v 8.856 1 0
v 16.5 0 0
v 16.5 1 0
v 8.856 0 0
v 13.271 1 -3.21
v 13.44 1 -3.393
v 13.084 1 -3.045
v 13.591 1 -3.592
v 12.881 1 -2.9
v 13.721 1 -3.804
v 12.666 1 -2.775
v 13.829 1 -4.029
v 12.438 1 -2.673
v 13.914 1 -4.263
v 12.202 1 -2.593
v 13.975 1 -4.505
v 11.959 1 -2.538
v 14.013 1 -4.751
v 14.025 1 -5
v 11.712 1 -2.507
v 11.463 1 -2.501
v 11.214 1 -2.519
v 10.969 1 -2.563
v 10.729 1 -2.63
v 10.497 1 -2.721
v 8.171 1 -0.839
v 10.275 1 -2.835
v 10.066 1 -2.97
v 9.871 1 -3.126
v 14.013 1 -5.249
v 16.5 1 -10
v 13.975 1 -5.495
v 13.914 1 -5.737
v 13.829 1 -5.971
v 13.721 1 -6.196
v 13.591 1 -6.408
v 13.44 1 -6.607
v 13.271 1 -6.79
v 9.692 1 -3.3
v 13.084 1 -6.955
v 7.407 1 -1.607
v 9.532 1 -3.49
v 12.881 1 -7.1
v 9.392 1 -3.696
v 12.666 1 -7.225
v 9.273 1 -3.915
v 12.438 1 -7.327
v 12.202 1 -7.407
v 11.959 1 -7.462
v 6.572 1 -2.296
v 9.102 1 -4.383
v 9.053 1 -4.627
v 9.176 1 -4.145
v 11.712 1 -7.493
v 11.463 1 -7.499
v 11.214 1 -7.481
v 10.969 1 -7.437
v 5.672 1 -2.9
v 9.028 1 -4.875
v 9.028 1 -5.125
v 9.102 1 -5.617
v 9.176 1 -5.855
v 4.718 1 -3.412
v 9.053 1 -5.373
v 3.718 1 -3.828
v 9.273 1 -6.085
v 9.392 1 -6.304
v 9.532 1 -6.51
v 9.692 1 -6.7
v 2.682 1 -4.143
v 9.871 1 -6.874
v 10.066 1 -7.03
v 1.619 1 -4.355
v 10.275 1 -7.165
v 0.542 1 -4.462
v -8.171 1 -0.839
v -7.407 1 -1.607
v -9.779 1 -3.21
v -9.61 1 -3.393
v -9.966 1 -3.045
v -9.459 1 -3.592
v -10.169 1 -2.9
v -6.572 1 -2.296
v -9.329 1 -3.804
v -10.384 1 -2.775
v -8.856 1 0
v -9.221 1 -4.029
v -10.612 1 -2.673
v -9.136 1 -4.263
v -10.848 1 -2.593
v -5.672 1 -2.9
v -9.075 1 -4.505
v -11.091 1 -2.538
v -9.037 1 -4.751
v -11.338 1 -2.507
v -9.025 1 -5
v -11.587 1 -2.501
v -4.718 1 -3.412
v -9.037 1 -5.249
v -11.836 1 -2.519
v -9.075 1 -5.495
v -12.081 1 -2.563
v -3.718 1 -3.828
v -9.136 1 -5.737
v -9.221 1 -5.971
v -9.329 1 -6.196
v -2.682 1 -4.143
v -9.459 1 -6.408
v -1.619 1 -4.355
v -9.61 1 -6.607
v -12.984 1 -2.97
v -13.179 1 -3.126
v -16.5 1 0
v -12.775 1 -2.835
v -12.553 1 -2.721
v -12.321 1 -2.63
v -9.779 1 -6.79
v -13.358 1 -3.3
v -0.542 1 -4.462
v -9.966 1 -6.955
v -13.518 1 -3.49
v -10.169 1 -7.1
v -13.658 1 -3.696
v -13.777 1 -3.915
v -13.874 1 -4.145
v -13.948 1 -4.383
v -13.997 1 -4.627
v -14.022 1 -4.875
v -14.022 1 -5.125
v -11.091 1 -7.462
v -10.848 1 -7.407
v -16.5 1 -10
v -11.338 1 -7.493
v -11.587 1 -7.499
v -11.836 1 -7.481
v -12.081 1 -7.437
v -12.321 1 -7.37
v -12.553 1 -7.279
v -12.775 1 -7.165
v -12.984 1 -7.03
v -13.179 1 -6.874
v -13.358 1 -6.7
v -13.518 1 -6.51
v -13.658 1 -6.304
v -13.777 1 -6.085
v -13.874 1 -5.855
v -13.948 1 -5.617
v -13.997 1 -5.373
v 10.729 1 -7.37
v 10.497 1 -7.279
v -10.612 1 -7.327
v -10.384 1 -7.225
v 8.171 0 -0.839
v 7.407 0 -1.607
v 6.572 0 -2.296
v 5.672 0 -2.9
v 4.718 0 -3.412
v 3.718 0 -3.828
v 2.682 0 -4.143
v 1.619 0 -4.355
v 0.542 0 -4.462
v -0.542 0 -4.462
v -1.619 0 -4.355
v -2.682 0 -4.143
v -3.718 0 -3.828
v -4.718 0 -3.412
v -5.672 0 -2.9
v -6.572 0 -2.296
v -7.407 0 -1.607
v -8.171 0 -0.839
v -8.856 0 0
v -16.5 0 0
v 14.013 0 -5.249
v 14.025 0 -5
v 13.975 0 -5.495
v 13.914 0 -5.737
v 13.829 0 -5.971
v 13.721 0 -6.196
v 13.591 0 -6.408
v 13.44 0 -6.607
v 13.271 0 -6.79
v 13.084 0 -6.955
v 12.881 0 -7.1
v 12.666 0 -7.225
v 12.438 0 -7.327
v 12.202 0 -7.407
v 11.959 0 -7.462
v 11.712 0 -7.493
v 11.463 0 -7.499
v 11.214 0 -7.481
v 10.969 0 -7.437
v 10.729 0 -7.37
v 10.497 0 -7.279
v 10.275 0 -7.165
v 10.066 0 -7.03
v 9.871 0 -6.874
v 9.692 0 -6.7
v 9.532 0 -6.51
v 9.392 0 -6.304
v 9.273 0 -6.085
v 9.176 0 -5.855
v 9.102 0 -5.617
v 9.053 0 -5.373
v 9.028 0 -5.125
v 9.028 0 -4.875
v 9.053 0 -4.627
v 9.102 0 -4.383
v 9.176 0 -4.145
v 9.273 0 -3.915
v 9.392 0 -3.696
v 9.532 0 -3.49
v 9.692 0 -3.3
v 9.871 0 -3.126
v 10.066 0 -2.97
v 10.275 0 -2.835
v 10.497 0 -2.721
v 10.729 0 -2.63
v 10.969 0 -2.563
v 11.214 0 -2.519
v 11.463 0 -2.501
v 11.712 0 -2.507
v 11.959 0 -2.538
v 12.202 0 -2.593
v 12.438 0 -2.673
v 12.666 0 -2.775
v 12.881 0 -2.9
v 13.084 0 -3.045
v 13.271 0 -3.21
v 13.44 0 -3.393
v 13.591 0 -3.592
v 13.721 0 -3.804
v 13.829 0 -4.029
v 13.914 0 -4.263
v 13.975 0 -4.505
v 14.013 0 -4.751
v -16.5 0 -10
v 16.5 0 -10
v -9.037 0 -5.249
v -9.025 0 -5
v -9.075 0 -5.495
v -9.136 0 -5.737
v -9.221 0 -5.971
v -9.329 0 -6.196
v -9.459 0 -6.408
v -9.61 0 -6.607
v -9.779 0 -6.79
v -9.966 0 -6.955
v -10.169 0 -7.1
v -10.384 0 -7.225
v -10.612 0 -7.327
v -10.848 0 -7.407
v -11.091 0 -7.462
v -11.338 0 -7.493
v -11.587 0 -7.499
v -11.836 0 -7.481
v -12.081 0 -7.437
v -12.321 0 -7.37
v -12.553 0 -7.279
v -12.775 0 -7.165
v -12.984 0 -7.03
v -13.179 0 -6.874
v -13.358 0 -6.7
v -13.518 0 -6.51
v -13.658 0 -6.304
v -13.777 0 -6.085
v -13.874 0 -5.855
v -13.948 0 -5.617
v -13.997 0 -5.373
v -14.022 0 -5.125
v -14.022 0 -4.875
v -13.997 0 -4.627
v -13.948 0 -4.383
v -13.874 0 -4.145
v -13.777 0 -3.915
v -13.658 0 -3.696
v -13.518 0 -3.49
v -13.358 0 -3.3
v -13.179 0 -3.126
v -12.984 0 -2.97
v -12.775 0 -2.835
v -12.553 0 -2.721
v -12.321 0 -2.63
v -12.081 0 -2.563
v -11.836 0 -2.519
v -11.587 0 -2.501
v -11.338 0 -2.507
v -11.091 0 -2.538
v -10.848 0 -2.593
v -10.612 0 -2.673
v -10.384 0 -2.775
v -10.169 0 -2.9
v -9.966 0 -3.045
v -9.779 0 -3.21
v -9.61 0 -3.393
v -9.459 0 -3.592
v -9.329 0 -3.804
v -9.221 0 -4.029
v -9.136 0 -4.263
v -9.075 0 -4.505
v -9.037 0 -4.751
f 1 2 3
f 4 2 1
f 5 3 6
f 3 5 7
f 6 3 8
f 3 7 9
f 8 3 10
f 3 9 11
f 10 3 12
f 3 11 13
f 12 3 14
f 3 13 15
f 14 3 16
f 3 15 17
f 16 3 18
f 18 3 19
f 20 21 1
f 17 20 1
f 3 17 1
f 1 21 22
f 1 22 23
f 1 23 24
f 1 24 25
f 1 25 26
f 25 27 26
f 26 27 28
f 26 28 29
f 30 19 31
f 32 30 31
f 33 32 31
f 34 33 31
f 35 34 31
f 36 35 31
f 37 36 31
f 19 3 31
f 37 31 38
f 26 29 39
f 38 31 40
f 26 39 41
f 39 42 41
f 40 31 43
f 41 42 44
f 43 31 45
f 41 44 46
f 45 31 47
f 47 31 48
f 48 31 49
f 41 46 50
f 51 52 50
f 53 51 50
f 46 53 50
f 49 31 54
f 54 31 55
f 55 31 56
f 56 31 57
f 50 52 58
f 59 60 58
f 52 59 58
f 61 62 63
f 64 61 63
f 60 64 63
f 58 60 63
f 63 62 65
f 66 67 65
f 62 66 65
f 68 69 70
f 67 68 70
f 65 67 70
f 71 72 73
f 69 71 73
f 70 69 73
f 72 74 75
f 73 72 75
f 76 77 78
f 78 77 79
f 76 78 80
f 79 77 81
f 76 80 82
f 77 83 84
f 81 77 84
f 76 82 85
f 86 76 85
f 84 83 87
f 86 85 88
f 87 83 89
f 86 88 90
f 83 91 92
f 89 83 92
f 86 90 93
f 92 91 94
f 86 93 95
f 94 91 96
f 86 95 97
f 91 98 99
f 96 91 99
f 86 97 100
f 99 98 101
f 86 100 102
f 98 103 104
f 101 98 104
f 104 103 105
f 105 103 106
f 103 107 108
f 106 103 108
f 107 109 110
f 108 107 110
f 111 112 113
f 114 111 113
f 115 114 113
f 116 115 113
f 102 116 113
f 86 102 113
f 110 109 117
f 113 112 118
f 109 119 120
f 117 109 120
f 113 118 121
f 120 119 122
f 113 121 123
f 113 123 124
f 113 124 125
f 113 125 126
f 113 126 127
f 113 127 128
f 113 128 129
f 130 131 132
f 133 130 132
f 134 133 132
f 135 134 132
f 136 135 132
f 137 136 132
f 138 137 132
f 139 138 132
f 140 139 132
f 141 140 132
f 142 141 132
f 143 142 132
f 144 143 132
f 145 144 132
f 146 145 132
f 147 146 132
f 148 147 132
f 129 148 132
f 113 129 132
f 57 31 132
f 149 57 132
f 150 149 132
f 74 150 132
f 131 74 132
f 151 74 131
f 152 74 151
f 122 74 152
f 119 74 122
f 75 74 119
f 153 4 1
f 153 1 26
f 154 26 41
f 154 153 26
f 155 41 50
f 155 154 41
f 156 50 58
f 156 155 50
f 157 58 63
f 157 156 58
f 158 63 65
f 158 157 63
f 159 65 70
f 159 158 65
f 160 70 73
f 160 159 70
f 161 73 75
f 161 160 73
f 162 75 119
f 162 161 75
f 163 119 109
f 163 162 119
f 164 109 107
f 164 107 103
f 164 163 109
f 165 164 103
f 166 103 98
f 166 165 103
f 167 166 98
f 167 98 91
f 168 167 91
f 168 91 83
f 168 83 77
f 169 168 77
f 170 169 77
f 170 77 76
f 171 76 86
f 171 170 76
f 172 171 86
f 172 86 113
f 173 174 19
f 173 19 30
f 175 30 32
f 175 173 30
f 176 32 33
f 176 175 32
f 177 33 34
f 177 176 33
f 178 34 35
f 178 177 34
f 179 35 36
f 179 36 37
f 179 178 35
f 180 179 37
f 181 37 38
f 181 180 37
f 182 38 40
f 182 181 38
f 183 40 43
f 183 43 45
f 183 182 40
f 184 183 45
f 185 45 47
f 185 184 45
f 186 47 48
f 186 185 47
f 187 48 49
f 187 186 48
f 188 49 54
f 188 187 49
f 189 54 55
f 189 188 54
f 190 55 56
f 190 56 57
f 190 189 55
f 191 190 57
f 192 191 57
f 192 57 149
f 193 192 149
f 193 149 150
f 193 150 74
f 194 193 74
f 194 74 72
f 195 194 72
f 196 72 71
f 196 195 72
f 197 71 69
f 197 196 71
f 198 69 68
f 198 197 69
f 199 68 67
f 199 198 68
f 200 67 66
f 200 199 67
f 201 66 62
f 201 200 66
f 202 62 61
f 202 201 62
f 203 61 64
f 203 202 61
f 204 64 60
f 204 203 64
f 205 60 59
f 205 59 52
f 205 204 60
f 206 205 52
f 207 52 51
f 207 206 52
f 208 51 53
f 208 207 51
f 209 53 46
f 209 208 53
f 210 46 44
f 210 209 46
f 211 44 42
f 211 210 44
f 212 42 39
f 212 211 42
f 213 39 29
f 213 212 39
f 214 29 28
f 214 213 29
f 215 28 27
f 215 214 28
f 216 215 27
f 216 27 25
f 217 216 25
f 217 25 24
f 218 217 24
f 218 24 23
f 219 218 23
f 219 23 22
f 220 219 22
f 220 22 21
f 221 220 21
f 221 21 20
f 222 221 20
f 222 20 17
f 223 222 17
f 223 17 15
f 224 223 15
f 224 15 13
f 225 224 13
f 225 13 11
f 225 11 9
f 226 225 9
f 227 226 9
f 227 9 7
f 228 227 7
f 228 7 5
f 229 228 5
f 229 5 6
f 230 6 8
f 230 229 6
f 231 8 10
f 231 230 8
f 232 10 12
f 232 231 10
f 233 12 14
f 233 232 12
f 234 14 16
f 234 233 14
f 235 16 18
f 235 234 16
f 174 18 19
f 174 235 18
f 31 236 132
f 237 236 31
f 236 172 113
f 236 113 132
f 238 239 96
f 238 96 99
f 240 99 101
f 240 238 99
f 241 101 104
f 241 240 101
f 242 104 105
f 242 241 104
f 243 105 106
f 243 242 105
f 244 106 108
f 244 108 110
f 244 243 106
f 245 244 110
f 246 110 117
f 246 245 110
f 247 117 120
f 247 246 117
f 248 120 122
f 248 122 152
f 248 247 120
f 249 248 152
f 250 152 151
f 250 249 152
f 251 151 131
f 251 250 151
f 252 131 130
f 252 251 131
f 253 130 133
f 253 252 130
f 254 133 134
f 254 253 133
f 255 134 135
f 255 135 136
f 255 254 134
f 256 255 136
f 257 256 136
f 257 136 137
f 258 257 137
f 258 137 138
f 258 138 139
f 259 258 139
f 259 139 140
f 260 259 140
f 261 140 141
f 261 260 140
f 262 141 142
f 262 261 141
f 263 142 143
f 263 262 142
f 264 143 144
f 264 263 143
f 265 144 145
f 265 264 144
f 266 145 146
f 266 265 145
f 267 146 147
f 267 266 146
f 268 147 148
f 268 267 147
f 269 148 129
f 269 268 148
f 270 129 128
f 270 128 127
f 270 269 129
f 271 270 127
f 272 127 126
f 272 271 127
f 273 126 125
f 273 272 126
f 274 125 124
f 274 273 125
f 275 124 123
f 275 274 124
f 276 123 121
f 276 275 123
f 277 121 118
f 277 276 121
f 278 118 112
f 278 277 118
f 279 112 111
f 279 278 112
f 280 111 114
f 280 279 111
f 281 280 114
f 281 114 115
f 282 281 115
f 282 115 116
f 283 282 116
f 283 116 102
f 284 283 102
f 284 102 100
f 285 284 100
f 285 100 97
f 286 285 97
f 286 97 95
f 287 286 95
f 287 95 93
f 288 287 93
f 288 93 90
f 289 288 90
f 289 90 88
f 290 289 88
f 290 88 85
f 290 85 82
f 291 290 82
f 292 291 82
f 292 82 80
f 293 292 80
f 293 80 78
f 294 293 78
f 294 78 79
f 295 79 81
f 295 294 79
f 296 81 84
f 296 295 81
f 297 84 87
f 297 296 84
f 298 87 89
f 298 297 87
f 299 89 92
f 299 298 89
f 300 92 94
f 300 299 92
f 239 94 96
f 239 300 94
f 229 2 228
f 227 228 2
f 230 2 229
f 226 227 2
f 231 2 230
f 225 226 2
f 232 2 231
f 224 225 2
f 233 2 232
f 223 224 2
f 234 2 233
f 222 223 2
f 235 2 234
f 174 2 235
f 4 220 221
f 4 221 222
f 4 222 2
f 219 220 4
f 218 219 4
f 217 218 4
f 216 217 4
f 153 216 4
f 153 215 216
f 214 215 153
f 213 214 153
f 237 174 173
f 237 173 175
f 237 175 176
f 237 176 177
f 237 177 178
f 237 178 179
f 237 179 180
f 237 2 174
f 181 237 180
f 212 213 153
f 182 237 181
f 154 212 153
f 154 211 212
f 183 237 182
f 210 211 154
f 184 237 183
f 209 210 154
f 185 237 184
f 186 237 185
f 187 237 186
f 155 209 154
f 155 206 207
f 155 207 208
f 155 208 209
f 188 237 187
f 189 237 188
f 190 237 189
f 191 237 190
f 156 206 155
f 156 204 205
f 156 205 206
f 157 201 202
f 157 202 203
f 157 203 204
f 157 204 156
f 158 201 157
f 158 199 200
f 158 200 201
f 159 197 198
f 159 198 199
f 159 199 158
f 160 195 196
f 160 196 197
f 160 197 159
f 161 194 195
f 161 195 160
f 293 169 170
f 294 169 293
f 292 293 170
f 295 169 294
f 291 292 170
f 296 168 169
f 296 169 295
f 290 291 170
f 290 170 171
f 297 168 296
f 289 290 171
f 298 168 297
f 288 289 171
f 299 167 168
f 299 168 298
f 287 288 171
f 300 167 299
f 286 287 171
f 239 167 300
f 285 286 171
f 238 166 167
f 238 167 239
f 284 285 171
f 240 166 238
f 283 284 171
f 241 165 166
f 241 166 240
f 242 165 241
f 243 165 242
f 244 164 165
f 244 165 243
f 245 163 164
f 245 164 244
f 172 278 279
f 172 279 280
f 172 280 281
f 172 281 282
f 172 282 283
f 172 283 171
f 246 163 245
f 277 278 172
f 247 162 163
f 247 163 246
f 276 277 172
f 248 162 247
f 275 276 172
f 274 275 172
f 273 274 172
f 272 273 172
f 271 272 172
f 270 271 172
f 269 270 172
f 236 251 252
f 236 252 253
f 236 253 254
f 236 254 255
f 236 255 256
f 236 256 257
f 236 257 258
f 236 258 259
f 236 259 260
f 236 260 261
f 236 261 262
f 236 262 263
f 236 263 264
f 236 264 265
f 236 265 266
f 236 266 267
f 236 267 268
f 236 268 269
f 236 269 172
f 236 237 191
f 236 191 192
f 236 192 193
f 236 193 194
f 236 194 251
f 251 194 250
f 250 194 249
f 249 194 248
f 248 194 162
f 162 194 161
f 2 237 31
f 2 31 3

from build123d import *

# Parameters (mm, degrees)
SKETCH1_R           = 2.5
BOSS_EXTRUDE1_DEPTH = 1


with BuildPart() as part:
    # Sketch1 → Boss-Extrude1 (new body)
    with BuildSketch(Plane(origin=(0, 0, 0), x_dir=(1, 0, 0), z_dir=(0, 1, 0))):
        with BuildLine():
            Line((-16.5, 10), (16.5, 10))
            Line((16.5, 10), (16.5, 0))
            Line((16.5, 0), (8.855753779, 0))
            ThreePointArc((8.855753779, 0), (0, 4.475), (-8.855753779, 0))
            Line((-8.855753779, 0), (-16.5, 0))
            Line((-16.5, 0), (-16.5, 10))
        make_face()
        with Locations((-11.525, 5)):
            Circle(SKETCH1_R, mode=Mode.SUBTRACT)
        with Locations((11.525, 5)):
            Circle(SKETCH1_R, mode=Mode.SUBTRACT)
    extrude(amount=BOSS_EXTRUDE1_DEPTH)


solid = part.part
